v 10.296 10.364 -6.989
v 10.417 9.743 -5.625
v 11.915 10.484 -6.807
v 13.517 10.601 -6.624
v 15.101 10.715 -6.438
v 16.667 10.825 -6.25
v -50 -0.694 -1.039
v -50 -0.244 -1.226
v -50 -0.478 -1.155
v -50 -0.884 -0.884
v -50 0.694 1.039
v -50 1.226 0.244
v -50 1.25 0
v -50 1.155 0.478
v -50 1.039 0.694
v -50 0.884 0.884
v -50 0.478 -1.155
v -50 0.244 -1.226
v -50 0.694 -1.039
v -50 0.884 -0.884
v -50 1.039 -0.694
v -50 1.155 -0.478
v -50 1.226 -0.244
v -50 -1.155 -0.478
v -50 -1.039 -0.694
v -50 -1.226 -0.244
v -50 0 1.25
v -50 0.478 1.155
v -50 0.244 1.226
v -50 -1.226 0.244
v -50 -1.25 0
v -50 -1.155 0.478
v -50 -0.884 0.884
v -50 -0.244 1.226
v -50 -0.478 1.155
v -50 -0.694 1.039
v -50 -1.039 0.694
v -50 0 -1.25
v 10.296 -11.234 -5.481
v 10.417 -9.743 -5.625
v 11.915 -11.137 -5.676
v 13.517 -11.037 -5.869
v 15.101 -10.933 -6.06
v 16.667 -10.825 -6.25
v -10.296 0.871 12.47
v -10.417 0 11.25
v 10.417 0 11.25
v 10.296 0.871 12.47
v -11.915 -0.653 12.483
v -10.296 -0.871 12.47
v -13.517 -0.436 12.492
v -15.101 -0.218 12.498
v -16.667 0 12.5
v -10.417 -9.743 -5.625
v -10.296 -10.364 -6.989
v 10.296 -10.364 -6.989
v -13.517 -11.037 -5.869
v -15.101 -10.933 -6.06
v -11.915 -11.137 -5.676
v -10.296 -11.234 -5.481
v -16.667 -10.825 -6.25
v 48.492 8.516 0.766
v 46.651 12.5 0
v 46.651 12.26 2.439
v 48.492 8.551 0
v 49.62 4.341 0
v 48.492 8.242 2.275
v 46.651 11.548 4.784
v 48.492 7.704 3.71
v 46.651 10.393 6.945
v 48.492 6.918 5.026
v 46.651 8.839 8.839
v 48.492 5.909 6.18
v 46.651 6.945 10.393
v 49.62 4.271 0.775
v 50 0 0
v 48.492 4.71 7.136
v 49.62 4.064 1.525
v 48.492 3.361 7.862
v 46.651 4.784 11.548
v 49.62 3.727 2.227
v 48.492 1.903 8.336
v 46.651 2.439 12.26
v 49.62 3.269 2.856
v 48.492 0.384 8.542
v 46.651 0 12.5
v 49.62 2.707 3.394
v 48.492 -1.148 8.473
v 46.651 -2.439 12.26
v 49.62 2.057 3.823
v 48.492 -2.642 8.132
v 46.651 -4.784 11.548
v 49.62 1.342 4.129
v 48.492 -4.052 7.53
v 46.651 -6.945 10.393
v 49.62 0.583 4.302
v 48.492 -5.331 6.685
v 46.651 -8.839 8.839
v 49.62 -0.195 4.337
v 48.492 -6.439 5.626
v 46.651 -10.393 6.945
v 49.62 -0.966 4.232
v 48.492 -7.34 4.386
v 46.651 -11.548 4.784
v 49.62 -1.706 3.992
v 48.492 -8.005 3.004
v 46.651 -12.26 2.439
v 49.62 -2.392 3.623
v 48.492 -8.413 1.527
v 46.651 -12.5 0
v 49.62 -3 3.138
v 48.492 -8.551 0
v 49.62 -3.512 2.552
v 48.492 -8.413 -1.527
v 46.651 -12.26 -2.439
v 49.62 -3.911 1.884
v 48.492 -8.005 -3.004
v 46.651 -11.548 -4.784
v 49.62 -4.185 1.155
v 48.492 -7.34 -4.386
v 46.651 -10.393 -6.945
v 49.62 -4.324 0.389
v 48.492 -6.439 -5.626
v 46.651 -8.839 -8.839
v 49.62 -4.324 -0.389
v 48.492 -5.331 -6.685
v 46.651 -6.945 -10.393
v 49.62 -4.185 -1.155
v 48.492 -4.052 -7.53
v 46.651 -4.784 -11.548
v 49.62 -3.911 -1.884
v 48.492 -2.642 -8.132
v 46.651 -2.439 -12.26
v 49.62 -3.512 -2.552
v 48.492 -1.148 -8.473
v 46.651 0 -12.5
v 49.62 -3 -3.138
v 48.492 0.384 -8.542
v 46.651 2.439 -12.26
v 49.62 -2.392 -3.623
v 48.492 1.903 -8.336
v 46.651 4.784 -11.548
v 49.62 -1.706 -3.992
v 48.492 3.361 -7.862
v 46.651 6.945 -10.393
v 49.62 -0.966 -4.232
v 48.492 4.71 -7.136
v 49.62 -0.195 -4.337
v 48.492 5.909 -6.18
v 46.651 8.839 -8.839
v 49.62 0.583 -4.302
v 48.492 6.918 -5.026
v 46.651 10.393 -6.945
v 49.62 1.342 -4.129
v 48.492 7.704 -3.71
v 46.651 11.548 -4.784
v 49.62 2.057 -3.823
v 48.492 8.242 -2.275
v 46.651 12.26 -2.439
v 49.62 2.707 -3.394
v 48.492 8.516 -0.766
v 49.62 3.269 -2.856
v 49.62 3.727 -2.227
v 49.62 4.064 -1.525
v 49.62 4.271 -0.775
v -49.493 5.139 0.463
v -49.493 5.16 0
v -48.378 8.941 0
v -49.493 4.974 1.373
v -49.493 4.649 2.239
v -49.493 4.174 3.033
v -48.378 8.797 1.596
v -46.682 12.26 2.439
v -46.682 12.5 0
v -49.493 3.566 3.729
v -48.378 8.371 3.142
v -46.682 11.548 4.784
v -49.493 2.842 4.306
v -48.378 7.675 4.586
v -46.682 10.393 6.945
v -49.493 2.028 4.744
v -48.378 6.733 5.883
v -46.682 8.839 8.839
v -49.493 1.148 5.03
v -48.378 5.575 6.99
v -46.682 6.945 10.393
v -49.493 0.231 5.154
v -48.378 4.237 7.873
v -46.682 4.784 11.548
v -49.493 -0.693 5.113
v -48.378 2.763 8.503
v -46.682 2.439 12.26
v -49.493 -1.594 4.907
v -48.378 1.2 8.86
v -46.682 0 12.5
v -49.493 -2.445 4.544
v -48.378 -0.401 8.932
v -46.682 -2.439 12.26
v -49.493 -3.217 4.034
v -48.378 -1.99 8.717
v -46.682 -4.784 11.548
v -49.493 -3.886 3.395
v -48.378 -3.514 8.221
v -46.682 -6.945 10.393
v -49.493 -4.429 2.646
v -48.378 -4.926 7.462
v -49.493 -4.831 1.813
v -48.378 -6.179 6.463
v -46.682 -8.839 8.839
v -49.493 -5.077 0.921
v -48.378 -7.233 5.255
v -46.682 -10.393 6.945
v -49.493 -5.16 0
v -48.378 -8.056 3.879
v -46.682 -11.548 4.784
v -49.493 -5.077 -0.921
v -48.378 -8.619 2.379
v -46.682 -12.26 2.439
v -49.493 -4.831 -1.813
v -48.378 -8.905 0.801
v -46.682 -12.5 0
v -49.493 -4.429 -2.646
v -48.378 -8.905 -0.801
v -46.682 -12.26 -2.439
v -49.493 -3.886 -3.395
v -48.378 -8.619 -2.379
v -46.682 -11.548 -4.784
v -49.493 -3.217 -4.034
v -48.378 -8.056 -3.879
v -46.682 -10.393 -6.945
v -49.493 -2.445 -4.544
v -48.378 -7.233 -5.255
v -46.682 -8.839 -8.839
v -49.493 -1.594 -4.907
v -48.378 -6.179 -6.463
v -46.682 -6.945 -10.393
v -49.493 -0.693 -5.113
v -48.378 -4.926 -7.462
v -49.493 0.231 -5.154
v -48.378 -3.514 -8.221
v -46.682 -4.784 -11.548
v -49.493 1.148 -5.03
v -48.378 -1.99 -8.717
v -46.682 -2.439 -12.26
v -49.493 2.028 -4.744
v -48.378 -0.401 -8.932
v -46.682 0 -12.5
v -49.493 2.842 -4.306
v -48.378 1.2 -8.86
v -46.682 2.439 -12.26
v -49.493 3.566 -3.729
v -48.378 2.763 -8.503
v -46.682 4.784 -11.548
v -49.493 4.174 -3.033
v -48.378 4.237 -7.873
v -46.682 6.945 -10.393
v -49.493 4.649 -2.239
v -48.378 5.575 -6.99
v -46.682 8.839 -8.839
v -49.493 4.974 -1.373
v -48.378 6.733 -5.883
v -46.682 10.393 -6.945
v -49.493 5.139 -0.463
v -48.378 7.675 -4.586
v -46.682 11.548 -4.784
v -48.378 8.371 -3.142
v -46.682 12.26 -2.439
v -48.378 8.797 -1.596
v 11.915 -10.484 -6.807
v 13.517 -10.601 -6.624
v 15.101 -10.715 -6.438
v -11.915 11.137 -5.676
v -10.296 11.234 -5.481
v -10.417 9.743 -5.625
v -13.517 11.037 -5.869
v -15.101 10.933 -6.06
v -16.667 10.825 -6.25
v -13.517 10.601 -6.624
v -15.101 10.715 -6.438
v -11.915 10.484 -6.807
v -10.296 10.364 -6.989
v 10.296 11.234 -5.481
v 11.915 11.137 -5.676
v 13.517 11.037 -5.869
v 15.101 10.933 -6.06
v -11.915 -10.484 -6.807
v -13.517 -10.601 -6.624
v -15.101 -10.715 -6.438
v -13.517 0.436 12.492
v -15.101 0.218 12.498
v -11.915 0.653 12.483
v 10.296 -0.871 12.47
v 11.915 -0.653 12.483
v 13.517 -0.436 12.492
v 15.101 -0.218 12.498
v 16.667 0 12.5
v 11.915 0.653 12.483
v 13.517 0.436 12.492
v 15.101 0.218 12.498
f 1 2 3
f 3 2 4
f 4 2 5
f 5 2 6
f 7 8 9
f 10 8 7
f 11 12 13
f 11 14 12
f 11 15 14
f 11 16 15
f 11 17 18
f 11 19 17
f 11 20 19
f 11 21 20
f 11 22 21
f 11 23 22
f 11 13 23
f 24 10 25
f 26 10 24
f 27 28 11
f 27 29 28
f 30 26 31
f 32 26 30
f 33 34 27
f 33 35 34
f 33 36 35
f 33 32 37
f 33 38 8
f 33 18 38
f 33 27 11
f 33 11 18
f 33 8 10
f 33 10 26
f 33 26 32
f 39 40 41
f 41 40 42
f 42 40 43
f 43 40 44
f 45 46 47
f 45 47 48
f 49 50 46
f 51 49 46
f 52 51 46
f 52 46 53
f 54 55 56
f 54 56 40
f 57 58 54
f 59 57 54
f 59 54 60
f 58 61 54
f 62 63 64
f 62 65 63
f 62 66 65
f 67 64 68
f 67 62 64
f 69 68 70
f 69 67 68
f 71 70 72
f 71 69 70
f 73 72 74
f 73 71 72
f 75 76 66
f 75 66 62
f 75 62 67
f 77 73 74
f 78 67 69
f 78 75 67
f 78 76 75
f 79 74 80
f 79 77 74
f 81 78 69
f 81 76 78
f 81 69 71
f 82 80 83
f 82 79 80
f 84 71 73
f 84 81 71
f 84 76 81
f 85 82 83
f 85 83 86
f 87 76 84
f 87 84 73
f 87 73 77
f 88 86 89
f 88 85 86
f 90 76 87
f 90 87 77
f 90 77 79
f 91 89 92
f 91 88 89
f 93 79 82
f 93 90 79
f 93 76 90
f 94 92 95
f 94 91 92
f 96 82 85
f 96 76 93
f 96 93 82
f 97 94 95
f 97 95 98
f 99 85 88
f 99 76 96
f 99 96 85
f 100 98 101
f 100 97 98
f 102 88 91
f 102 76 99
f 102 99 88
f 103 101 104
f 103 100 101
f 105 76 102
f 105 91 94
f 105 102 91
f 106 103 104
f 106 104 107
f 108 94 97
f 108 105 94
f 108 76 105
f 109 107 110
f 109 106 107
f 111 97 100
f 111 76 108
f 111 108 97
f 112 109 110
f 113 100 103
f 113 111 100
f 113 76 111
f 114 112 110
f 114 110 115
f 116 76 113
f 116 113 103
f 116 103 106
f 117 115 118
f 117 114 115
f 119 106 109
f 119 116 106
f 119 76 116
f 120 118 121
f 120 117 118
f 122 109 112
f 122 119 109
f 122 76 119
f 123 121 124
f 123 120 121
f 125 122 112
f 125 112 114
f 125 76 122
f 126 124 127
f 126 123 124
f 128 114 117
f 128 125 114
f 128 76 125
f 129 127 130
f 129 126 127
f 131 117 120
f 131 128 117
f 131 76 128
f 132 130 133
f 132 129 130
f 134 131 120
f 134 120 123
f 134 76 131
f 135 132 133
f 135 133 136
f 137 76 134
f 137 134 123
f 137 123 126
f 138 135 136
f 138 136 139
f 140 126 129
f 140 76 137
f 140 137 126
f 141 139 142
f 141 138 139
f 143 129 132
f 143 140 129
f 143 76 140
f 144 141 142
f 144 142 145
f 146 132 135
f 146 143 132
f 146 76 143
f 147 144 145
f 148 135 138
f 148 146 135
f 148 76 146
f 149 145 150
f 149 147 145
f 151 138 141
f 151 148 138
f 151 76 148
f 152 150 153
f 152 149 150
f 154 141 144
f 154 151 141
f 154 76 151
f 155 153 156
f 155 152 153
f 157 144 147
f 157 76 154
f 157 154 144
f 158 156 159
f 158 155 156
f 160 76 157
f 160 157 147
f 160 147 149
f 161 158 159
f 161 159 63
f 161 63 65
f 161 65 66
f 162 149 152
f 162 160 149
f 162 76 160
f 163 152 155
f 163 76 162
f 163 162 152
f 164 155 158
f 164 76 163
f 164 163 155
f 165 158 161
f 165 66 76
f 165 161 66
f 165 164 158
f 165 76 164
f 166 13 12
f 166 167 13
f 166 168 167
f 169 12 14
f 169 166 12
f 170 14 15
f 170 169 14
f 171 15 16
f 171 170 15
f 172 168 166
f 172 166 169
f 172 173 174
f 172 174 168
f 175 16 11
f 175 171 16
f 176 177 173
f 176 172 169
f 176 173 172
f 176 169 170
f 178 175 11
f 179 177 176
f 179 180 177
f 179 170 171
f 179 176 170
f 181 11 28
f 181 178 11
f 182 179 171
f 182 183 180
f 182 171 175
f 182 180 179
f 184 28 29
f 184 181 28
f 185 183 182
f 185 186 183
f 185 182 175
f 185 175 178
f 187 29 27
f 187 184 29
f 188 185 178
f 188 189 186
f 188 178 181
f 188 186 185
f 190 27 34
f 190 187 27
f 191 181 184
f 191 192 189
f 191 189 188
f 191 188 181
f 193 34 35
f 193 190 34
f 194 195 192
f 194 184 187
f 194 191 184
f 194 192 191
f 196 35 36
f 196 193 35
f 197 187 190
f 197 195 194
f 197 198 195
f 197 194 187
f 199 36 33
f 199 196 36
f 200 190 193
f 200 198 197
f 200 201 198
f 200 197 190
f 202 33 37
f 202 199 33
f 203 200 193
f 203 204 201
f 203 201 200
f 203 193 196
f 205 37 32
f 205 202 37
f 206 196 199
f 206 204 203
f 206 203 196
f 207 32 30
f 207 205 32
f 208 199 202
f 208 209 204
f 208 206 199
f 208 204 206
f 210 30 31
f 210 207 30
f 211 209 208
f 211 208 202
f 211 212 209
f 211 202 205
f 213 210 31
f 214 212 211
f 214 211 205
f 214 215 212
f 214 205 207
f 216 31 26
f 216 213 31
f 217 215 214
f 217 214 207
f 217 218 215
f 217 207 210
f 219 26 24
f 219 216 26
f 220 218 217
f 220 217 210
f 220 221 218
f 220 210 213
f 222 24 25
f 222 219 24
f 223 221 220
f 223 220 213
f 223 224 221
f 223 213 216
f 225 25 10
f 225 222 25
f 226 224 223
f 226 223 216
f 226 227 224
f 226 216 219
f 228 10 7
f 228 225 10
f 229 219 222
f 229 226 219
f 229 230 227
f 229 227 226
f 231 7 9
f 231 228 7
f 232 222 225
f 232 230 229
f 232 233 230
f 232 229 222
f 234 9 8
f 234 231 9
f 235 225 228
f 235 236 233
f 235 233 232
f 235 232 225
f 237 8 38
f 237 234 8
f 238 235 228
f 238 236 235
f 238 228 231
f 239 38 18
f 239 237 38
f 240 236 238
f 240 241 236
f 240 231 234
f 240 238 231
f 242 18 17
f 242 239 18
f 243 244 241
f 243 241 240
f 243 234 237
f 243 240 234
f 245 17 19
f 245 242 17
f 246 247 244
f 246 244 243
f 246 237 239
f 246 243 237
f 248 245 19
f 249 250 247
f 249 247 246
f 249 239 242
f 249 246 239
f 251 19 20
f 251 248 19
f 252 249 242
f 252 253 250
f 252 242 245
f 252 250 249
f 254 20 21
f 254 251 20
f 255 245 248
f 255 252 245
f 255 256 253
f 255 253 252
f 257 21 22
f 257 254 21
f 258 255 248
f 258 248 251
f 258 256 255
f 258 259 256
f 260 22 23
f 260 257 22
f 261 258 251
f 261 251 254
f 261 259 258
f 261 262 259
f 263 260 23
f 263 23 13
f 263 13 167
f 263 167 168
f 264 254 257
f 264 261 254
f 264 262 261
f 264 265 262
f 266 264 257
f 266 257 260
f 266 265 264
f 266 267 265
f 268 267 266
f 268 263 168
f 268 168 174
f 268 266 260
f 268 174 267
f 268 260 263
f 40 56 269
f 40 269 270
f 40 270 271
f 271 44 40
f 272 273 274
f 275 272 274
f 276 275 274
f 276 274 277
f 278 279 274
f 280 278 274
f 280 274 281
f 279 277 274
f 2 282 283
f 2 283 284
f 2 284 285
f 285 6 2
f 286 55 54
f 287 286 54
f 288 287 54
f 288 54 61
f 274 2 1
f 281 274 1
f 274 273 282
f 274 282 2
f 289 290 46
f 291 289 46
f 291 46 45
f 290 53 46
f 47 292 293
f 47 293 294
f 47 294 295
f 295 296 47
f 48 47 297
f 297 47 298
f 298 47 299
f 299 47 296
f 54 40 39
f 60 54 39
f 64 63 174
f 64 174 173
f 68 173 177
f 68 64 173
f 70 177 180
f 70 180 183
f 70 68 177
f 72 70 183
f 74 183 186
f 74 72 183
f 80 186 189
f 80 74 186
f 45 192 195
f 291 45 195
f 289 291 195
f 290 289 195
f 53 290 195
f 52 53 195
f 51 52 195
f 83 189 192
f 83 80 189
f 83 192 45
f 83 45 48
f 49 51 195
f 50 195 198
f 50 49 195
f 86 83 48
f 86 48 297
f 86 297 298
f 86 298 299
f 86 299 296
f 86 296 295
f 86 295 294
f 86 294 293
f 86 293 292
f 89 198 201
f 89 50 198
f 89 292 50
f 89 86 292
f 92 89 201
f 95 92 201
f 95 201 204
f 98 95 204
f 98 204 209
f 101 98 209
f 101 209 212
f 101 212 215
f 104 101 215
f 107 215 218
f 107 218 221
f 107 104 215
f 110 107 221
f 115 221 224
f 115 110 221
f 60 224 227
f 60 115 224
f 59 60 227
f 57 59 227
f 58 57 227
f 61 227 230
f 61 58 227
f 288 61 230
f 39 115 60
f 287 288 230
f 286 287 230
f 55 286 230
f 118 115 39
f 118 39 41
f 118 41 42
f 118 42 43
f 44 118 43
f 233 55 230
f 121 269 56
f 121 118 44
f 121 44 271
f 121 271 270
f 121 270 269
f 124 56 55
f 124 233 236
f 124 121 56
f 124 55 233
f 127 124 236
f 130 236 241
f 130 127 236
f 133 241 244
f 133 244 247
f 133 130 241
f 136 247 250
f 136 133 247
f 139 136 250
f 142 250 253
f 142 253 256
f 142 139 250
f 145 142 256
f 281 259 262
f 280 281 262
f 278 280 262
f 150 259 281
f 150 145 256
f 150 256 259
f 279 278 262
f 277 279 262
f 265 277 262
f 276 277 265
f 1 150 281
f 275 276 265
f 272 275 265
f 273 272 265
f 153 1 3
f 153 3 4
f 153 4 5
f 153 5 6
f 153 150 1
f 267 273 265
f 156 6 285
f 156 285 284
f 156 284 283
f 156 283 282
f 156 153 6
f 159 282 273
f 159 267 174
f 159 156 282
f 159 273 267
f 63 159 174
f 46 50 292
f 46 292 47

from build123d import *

# Parameters (mm, degrees)
CIRPATTERN2_COUNT = 3


with BuildPart() as part:
    # Sketch1 → Base-Revolve (revolve)
    with BuildSketch(Plane.XY):
        with BuildLine():
            Line((-50, 0), (-50, 1.25))
            ThreePointArc((-50, 1.25), (-49.010050505, 7.072345027), (-46.68190465, 12.5))
            Line((-46.68190465, 12.5), (46.650635095, 12.5))
            ThreePointArc((46.650635095, 12.5), (49.148145657, 6.470476128), (50, 0))
            Line((50, 0), (-50, 0))
        make_face()
    revolve(axis=Axis((-57, 0, 0), (1, 0, 0)))

    # Cut-Sweep3: sweep along a path in Sketch3
    with BuildLine(Plane(origin=(0, 0, 0), x_dir=(1, 0, 0), z_dir=(0, 1, 0))) as cut_sweep3_path:
        Line((-16.666666667, -12.5), (-10.416666667, -11.25))
        Line((-10.416666667, -11.25), (10.416666667, -11.25))
        Line((10.416666667, -11.25), (16.666666667, -12.5))
    # Sketch4 → Cut-Sweep3 (sweep, cut)
    with BuildSketch(Plane(origin=(-16.666666667, 0, 0), x_dir=(0, 0, -1), z_dir=(1, 0, 0))):
        Polygon((-12.5, 0), (-14.378358908, 1.315241067), (-14.378358908, -1.315241067), align=None)
    cut_sweep3 = sweep(path=cut_sweep3_path.line, transition=Transition.RIGHT, mode=Mode.SUBTRACT)

    # CirPattern2: Cut-Sweep3 ×3 about axis
    cirpattern2_axis = Axis((0, 0, 0), (1, 0, 0))
    for i in range(1, CIRPATTERN2_COUNT):
        add(cut_sweep3.rotate(cirpattern2_axis, i * 360 / CIRPATTERN2_COUNT), mode=Mode.SUBTRACT)


solid = part.part
